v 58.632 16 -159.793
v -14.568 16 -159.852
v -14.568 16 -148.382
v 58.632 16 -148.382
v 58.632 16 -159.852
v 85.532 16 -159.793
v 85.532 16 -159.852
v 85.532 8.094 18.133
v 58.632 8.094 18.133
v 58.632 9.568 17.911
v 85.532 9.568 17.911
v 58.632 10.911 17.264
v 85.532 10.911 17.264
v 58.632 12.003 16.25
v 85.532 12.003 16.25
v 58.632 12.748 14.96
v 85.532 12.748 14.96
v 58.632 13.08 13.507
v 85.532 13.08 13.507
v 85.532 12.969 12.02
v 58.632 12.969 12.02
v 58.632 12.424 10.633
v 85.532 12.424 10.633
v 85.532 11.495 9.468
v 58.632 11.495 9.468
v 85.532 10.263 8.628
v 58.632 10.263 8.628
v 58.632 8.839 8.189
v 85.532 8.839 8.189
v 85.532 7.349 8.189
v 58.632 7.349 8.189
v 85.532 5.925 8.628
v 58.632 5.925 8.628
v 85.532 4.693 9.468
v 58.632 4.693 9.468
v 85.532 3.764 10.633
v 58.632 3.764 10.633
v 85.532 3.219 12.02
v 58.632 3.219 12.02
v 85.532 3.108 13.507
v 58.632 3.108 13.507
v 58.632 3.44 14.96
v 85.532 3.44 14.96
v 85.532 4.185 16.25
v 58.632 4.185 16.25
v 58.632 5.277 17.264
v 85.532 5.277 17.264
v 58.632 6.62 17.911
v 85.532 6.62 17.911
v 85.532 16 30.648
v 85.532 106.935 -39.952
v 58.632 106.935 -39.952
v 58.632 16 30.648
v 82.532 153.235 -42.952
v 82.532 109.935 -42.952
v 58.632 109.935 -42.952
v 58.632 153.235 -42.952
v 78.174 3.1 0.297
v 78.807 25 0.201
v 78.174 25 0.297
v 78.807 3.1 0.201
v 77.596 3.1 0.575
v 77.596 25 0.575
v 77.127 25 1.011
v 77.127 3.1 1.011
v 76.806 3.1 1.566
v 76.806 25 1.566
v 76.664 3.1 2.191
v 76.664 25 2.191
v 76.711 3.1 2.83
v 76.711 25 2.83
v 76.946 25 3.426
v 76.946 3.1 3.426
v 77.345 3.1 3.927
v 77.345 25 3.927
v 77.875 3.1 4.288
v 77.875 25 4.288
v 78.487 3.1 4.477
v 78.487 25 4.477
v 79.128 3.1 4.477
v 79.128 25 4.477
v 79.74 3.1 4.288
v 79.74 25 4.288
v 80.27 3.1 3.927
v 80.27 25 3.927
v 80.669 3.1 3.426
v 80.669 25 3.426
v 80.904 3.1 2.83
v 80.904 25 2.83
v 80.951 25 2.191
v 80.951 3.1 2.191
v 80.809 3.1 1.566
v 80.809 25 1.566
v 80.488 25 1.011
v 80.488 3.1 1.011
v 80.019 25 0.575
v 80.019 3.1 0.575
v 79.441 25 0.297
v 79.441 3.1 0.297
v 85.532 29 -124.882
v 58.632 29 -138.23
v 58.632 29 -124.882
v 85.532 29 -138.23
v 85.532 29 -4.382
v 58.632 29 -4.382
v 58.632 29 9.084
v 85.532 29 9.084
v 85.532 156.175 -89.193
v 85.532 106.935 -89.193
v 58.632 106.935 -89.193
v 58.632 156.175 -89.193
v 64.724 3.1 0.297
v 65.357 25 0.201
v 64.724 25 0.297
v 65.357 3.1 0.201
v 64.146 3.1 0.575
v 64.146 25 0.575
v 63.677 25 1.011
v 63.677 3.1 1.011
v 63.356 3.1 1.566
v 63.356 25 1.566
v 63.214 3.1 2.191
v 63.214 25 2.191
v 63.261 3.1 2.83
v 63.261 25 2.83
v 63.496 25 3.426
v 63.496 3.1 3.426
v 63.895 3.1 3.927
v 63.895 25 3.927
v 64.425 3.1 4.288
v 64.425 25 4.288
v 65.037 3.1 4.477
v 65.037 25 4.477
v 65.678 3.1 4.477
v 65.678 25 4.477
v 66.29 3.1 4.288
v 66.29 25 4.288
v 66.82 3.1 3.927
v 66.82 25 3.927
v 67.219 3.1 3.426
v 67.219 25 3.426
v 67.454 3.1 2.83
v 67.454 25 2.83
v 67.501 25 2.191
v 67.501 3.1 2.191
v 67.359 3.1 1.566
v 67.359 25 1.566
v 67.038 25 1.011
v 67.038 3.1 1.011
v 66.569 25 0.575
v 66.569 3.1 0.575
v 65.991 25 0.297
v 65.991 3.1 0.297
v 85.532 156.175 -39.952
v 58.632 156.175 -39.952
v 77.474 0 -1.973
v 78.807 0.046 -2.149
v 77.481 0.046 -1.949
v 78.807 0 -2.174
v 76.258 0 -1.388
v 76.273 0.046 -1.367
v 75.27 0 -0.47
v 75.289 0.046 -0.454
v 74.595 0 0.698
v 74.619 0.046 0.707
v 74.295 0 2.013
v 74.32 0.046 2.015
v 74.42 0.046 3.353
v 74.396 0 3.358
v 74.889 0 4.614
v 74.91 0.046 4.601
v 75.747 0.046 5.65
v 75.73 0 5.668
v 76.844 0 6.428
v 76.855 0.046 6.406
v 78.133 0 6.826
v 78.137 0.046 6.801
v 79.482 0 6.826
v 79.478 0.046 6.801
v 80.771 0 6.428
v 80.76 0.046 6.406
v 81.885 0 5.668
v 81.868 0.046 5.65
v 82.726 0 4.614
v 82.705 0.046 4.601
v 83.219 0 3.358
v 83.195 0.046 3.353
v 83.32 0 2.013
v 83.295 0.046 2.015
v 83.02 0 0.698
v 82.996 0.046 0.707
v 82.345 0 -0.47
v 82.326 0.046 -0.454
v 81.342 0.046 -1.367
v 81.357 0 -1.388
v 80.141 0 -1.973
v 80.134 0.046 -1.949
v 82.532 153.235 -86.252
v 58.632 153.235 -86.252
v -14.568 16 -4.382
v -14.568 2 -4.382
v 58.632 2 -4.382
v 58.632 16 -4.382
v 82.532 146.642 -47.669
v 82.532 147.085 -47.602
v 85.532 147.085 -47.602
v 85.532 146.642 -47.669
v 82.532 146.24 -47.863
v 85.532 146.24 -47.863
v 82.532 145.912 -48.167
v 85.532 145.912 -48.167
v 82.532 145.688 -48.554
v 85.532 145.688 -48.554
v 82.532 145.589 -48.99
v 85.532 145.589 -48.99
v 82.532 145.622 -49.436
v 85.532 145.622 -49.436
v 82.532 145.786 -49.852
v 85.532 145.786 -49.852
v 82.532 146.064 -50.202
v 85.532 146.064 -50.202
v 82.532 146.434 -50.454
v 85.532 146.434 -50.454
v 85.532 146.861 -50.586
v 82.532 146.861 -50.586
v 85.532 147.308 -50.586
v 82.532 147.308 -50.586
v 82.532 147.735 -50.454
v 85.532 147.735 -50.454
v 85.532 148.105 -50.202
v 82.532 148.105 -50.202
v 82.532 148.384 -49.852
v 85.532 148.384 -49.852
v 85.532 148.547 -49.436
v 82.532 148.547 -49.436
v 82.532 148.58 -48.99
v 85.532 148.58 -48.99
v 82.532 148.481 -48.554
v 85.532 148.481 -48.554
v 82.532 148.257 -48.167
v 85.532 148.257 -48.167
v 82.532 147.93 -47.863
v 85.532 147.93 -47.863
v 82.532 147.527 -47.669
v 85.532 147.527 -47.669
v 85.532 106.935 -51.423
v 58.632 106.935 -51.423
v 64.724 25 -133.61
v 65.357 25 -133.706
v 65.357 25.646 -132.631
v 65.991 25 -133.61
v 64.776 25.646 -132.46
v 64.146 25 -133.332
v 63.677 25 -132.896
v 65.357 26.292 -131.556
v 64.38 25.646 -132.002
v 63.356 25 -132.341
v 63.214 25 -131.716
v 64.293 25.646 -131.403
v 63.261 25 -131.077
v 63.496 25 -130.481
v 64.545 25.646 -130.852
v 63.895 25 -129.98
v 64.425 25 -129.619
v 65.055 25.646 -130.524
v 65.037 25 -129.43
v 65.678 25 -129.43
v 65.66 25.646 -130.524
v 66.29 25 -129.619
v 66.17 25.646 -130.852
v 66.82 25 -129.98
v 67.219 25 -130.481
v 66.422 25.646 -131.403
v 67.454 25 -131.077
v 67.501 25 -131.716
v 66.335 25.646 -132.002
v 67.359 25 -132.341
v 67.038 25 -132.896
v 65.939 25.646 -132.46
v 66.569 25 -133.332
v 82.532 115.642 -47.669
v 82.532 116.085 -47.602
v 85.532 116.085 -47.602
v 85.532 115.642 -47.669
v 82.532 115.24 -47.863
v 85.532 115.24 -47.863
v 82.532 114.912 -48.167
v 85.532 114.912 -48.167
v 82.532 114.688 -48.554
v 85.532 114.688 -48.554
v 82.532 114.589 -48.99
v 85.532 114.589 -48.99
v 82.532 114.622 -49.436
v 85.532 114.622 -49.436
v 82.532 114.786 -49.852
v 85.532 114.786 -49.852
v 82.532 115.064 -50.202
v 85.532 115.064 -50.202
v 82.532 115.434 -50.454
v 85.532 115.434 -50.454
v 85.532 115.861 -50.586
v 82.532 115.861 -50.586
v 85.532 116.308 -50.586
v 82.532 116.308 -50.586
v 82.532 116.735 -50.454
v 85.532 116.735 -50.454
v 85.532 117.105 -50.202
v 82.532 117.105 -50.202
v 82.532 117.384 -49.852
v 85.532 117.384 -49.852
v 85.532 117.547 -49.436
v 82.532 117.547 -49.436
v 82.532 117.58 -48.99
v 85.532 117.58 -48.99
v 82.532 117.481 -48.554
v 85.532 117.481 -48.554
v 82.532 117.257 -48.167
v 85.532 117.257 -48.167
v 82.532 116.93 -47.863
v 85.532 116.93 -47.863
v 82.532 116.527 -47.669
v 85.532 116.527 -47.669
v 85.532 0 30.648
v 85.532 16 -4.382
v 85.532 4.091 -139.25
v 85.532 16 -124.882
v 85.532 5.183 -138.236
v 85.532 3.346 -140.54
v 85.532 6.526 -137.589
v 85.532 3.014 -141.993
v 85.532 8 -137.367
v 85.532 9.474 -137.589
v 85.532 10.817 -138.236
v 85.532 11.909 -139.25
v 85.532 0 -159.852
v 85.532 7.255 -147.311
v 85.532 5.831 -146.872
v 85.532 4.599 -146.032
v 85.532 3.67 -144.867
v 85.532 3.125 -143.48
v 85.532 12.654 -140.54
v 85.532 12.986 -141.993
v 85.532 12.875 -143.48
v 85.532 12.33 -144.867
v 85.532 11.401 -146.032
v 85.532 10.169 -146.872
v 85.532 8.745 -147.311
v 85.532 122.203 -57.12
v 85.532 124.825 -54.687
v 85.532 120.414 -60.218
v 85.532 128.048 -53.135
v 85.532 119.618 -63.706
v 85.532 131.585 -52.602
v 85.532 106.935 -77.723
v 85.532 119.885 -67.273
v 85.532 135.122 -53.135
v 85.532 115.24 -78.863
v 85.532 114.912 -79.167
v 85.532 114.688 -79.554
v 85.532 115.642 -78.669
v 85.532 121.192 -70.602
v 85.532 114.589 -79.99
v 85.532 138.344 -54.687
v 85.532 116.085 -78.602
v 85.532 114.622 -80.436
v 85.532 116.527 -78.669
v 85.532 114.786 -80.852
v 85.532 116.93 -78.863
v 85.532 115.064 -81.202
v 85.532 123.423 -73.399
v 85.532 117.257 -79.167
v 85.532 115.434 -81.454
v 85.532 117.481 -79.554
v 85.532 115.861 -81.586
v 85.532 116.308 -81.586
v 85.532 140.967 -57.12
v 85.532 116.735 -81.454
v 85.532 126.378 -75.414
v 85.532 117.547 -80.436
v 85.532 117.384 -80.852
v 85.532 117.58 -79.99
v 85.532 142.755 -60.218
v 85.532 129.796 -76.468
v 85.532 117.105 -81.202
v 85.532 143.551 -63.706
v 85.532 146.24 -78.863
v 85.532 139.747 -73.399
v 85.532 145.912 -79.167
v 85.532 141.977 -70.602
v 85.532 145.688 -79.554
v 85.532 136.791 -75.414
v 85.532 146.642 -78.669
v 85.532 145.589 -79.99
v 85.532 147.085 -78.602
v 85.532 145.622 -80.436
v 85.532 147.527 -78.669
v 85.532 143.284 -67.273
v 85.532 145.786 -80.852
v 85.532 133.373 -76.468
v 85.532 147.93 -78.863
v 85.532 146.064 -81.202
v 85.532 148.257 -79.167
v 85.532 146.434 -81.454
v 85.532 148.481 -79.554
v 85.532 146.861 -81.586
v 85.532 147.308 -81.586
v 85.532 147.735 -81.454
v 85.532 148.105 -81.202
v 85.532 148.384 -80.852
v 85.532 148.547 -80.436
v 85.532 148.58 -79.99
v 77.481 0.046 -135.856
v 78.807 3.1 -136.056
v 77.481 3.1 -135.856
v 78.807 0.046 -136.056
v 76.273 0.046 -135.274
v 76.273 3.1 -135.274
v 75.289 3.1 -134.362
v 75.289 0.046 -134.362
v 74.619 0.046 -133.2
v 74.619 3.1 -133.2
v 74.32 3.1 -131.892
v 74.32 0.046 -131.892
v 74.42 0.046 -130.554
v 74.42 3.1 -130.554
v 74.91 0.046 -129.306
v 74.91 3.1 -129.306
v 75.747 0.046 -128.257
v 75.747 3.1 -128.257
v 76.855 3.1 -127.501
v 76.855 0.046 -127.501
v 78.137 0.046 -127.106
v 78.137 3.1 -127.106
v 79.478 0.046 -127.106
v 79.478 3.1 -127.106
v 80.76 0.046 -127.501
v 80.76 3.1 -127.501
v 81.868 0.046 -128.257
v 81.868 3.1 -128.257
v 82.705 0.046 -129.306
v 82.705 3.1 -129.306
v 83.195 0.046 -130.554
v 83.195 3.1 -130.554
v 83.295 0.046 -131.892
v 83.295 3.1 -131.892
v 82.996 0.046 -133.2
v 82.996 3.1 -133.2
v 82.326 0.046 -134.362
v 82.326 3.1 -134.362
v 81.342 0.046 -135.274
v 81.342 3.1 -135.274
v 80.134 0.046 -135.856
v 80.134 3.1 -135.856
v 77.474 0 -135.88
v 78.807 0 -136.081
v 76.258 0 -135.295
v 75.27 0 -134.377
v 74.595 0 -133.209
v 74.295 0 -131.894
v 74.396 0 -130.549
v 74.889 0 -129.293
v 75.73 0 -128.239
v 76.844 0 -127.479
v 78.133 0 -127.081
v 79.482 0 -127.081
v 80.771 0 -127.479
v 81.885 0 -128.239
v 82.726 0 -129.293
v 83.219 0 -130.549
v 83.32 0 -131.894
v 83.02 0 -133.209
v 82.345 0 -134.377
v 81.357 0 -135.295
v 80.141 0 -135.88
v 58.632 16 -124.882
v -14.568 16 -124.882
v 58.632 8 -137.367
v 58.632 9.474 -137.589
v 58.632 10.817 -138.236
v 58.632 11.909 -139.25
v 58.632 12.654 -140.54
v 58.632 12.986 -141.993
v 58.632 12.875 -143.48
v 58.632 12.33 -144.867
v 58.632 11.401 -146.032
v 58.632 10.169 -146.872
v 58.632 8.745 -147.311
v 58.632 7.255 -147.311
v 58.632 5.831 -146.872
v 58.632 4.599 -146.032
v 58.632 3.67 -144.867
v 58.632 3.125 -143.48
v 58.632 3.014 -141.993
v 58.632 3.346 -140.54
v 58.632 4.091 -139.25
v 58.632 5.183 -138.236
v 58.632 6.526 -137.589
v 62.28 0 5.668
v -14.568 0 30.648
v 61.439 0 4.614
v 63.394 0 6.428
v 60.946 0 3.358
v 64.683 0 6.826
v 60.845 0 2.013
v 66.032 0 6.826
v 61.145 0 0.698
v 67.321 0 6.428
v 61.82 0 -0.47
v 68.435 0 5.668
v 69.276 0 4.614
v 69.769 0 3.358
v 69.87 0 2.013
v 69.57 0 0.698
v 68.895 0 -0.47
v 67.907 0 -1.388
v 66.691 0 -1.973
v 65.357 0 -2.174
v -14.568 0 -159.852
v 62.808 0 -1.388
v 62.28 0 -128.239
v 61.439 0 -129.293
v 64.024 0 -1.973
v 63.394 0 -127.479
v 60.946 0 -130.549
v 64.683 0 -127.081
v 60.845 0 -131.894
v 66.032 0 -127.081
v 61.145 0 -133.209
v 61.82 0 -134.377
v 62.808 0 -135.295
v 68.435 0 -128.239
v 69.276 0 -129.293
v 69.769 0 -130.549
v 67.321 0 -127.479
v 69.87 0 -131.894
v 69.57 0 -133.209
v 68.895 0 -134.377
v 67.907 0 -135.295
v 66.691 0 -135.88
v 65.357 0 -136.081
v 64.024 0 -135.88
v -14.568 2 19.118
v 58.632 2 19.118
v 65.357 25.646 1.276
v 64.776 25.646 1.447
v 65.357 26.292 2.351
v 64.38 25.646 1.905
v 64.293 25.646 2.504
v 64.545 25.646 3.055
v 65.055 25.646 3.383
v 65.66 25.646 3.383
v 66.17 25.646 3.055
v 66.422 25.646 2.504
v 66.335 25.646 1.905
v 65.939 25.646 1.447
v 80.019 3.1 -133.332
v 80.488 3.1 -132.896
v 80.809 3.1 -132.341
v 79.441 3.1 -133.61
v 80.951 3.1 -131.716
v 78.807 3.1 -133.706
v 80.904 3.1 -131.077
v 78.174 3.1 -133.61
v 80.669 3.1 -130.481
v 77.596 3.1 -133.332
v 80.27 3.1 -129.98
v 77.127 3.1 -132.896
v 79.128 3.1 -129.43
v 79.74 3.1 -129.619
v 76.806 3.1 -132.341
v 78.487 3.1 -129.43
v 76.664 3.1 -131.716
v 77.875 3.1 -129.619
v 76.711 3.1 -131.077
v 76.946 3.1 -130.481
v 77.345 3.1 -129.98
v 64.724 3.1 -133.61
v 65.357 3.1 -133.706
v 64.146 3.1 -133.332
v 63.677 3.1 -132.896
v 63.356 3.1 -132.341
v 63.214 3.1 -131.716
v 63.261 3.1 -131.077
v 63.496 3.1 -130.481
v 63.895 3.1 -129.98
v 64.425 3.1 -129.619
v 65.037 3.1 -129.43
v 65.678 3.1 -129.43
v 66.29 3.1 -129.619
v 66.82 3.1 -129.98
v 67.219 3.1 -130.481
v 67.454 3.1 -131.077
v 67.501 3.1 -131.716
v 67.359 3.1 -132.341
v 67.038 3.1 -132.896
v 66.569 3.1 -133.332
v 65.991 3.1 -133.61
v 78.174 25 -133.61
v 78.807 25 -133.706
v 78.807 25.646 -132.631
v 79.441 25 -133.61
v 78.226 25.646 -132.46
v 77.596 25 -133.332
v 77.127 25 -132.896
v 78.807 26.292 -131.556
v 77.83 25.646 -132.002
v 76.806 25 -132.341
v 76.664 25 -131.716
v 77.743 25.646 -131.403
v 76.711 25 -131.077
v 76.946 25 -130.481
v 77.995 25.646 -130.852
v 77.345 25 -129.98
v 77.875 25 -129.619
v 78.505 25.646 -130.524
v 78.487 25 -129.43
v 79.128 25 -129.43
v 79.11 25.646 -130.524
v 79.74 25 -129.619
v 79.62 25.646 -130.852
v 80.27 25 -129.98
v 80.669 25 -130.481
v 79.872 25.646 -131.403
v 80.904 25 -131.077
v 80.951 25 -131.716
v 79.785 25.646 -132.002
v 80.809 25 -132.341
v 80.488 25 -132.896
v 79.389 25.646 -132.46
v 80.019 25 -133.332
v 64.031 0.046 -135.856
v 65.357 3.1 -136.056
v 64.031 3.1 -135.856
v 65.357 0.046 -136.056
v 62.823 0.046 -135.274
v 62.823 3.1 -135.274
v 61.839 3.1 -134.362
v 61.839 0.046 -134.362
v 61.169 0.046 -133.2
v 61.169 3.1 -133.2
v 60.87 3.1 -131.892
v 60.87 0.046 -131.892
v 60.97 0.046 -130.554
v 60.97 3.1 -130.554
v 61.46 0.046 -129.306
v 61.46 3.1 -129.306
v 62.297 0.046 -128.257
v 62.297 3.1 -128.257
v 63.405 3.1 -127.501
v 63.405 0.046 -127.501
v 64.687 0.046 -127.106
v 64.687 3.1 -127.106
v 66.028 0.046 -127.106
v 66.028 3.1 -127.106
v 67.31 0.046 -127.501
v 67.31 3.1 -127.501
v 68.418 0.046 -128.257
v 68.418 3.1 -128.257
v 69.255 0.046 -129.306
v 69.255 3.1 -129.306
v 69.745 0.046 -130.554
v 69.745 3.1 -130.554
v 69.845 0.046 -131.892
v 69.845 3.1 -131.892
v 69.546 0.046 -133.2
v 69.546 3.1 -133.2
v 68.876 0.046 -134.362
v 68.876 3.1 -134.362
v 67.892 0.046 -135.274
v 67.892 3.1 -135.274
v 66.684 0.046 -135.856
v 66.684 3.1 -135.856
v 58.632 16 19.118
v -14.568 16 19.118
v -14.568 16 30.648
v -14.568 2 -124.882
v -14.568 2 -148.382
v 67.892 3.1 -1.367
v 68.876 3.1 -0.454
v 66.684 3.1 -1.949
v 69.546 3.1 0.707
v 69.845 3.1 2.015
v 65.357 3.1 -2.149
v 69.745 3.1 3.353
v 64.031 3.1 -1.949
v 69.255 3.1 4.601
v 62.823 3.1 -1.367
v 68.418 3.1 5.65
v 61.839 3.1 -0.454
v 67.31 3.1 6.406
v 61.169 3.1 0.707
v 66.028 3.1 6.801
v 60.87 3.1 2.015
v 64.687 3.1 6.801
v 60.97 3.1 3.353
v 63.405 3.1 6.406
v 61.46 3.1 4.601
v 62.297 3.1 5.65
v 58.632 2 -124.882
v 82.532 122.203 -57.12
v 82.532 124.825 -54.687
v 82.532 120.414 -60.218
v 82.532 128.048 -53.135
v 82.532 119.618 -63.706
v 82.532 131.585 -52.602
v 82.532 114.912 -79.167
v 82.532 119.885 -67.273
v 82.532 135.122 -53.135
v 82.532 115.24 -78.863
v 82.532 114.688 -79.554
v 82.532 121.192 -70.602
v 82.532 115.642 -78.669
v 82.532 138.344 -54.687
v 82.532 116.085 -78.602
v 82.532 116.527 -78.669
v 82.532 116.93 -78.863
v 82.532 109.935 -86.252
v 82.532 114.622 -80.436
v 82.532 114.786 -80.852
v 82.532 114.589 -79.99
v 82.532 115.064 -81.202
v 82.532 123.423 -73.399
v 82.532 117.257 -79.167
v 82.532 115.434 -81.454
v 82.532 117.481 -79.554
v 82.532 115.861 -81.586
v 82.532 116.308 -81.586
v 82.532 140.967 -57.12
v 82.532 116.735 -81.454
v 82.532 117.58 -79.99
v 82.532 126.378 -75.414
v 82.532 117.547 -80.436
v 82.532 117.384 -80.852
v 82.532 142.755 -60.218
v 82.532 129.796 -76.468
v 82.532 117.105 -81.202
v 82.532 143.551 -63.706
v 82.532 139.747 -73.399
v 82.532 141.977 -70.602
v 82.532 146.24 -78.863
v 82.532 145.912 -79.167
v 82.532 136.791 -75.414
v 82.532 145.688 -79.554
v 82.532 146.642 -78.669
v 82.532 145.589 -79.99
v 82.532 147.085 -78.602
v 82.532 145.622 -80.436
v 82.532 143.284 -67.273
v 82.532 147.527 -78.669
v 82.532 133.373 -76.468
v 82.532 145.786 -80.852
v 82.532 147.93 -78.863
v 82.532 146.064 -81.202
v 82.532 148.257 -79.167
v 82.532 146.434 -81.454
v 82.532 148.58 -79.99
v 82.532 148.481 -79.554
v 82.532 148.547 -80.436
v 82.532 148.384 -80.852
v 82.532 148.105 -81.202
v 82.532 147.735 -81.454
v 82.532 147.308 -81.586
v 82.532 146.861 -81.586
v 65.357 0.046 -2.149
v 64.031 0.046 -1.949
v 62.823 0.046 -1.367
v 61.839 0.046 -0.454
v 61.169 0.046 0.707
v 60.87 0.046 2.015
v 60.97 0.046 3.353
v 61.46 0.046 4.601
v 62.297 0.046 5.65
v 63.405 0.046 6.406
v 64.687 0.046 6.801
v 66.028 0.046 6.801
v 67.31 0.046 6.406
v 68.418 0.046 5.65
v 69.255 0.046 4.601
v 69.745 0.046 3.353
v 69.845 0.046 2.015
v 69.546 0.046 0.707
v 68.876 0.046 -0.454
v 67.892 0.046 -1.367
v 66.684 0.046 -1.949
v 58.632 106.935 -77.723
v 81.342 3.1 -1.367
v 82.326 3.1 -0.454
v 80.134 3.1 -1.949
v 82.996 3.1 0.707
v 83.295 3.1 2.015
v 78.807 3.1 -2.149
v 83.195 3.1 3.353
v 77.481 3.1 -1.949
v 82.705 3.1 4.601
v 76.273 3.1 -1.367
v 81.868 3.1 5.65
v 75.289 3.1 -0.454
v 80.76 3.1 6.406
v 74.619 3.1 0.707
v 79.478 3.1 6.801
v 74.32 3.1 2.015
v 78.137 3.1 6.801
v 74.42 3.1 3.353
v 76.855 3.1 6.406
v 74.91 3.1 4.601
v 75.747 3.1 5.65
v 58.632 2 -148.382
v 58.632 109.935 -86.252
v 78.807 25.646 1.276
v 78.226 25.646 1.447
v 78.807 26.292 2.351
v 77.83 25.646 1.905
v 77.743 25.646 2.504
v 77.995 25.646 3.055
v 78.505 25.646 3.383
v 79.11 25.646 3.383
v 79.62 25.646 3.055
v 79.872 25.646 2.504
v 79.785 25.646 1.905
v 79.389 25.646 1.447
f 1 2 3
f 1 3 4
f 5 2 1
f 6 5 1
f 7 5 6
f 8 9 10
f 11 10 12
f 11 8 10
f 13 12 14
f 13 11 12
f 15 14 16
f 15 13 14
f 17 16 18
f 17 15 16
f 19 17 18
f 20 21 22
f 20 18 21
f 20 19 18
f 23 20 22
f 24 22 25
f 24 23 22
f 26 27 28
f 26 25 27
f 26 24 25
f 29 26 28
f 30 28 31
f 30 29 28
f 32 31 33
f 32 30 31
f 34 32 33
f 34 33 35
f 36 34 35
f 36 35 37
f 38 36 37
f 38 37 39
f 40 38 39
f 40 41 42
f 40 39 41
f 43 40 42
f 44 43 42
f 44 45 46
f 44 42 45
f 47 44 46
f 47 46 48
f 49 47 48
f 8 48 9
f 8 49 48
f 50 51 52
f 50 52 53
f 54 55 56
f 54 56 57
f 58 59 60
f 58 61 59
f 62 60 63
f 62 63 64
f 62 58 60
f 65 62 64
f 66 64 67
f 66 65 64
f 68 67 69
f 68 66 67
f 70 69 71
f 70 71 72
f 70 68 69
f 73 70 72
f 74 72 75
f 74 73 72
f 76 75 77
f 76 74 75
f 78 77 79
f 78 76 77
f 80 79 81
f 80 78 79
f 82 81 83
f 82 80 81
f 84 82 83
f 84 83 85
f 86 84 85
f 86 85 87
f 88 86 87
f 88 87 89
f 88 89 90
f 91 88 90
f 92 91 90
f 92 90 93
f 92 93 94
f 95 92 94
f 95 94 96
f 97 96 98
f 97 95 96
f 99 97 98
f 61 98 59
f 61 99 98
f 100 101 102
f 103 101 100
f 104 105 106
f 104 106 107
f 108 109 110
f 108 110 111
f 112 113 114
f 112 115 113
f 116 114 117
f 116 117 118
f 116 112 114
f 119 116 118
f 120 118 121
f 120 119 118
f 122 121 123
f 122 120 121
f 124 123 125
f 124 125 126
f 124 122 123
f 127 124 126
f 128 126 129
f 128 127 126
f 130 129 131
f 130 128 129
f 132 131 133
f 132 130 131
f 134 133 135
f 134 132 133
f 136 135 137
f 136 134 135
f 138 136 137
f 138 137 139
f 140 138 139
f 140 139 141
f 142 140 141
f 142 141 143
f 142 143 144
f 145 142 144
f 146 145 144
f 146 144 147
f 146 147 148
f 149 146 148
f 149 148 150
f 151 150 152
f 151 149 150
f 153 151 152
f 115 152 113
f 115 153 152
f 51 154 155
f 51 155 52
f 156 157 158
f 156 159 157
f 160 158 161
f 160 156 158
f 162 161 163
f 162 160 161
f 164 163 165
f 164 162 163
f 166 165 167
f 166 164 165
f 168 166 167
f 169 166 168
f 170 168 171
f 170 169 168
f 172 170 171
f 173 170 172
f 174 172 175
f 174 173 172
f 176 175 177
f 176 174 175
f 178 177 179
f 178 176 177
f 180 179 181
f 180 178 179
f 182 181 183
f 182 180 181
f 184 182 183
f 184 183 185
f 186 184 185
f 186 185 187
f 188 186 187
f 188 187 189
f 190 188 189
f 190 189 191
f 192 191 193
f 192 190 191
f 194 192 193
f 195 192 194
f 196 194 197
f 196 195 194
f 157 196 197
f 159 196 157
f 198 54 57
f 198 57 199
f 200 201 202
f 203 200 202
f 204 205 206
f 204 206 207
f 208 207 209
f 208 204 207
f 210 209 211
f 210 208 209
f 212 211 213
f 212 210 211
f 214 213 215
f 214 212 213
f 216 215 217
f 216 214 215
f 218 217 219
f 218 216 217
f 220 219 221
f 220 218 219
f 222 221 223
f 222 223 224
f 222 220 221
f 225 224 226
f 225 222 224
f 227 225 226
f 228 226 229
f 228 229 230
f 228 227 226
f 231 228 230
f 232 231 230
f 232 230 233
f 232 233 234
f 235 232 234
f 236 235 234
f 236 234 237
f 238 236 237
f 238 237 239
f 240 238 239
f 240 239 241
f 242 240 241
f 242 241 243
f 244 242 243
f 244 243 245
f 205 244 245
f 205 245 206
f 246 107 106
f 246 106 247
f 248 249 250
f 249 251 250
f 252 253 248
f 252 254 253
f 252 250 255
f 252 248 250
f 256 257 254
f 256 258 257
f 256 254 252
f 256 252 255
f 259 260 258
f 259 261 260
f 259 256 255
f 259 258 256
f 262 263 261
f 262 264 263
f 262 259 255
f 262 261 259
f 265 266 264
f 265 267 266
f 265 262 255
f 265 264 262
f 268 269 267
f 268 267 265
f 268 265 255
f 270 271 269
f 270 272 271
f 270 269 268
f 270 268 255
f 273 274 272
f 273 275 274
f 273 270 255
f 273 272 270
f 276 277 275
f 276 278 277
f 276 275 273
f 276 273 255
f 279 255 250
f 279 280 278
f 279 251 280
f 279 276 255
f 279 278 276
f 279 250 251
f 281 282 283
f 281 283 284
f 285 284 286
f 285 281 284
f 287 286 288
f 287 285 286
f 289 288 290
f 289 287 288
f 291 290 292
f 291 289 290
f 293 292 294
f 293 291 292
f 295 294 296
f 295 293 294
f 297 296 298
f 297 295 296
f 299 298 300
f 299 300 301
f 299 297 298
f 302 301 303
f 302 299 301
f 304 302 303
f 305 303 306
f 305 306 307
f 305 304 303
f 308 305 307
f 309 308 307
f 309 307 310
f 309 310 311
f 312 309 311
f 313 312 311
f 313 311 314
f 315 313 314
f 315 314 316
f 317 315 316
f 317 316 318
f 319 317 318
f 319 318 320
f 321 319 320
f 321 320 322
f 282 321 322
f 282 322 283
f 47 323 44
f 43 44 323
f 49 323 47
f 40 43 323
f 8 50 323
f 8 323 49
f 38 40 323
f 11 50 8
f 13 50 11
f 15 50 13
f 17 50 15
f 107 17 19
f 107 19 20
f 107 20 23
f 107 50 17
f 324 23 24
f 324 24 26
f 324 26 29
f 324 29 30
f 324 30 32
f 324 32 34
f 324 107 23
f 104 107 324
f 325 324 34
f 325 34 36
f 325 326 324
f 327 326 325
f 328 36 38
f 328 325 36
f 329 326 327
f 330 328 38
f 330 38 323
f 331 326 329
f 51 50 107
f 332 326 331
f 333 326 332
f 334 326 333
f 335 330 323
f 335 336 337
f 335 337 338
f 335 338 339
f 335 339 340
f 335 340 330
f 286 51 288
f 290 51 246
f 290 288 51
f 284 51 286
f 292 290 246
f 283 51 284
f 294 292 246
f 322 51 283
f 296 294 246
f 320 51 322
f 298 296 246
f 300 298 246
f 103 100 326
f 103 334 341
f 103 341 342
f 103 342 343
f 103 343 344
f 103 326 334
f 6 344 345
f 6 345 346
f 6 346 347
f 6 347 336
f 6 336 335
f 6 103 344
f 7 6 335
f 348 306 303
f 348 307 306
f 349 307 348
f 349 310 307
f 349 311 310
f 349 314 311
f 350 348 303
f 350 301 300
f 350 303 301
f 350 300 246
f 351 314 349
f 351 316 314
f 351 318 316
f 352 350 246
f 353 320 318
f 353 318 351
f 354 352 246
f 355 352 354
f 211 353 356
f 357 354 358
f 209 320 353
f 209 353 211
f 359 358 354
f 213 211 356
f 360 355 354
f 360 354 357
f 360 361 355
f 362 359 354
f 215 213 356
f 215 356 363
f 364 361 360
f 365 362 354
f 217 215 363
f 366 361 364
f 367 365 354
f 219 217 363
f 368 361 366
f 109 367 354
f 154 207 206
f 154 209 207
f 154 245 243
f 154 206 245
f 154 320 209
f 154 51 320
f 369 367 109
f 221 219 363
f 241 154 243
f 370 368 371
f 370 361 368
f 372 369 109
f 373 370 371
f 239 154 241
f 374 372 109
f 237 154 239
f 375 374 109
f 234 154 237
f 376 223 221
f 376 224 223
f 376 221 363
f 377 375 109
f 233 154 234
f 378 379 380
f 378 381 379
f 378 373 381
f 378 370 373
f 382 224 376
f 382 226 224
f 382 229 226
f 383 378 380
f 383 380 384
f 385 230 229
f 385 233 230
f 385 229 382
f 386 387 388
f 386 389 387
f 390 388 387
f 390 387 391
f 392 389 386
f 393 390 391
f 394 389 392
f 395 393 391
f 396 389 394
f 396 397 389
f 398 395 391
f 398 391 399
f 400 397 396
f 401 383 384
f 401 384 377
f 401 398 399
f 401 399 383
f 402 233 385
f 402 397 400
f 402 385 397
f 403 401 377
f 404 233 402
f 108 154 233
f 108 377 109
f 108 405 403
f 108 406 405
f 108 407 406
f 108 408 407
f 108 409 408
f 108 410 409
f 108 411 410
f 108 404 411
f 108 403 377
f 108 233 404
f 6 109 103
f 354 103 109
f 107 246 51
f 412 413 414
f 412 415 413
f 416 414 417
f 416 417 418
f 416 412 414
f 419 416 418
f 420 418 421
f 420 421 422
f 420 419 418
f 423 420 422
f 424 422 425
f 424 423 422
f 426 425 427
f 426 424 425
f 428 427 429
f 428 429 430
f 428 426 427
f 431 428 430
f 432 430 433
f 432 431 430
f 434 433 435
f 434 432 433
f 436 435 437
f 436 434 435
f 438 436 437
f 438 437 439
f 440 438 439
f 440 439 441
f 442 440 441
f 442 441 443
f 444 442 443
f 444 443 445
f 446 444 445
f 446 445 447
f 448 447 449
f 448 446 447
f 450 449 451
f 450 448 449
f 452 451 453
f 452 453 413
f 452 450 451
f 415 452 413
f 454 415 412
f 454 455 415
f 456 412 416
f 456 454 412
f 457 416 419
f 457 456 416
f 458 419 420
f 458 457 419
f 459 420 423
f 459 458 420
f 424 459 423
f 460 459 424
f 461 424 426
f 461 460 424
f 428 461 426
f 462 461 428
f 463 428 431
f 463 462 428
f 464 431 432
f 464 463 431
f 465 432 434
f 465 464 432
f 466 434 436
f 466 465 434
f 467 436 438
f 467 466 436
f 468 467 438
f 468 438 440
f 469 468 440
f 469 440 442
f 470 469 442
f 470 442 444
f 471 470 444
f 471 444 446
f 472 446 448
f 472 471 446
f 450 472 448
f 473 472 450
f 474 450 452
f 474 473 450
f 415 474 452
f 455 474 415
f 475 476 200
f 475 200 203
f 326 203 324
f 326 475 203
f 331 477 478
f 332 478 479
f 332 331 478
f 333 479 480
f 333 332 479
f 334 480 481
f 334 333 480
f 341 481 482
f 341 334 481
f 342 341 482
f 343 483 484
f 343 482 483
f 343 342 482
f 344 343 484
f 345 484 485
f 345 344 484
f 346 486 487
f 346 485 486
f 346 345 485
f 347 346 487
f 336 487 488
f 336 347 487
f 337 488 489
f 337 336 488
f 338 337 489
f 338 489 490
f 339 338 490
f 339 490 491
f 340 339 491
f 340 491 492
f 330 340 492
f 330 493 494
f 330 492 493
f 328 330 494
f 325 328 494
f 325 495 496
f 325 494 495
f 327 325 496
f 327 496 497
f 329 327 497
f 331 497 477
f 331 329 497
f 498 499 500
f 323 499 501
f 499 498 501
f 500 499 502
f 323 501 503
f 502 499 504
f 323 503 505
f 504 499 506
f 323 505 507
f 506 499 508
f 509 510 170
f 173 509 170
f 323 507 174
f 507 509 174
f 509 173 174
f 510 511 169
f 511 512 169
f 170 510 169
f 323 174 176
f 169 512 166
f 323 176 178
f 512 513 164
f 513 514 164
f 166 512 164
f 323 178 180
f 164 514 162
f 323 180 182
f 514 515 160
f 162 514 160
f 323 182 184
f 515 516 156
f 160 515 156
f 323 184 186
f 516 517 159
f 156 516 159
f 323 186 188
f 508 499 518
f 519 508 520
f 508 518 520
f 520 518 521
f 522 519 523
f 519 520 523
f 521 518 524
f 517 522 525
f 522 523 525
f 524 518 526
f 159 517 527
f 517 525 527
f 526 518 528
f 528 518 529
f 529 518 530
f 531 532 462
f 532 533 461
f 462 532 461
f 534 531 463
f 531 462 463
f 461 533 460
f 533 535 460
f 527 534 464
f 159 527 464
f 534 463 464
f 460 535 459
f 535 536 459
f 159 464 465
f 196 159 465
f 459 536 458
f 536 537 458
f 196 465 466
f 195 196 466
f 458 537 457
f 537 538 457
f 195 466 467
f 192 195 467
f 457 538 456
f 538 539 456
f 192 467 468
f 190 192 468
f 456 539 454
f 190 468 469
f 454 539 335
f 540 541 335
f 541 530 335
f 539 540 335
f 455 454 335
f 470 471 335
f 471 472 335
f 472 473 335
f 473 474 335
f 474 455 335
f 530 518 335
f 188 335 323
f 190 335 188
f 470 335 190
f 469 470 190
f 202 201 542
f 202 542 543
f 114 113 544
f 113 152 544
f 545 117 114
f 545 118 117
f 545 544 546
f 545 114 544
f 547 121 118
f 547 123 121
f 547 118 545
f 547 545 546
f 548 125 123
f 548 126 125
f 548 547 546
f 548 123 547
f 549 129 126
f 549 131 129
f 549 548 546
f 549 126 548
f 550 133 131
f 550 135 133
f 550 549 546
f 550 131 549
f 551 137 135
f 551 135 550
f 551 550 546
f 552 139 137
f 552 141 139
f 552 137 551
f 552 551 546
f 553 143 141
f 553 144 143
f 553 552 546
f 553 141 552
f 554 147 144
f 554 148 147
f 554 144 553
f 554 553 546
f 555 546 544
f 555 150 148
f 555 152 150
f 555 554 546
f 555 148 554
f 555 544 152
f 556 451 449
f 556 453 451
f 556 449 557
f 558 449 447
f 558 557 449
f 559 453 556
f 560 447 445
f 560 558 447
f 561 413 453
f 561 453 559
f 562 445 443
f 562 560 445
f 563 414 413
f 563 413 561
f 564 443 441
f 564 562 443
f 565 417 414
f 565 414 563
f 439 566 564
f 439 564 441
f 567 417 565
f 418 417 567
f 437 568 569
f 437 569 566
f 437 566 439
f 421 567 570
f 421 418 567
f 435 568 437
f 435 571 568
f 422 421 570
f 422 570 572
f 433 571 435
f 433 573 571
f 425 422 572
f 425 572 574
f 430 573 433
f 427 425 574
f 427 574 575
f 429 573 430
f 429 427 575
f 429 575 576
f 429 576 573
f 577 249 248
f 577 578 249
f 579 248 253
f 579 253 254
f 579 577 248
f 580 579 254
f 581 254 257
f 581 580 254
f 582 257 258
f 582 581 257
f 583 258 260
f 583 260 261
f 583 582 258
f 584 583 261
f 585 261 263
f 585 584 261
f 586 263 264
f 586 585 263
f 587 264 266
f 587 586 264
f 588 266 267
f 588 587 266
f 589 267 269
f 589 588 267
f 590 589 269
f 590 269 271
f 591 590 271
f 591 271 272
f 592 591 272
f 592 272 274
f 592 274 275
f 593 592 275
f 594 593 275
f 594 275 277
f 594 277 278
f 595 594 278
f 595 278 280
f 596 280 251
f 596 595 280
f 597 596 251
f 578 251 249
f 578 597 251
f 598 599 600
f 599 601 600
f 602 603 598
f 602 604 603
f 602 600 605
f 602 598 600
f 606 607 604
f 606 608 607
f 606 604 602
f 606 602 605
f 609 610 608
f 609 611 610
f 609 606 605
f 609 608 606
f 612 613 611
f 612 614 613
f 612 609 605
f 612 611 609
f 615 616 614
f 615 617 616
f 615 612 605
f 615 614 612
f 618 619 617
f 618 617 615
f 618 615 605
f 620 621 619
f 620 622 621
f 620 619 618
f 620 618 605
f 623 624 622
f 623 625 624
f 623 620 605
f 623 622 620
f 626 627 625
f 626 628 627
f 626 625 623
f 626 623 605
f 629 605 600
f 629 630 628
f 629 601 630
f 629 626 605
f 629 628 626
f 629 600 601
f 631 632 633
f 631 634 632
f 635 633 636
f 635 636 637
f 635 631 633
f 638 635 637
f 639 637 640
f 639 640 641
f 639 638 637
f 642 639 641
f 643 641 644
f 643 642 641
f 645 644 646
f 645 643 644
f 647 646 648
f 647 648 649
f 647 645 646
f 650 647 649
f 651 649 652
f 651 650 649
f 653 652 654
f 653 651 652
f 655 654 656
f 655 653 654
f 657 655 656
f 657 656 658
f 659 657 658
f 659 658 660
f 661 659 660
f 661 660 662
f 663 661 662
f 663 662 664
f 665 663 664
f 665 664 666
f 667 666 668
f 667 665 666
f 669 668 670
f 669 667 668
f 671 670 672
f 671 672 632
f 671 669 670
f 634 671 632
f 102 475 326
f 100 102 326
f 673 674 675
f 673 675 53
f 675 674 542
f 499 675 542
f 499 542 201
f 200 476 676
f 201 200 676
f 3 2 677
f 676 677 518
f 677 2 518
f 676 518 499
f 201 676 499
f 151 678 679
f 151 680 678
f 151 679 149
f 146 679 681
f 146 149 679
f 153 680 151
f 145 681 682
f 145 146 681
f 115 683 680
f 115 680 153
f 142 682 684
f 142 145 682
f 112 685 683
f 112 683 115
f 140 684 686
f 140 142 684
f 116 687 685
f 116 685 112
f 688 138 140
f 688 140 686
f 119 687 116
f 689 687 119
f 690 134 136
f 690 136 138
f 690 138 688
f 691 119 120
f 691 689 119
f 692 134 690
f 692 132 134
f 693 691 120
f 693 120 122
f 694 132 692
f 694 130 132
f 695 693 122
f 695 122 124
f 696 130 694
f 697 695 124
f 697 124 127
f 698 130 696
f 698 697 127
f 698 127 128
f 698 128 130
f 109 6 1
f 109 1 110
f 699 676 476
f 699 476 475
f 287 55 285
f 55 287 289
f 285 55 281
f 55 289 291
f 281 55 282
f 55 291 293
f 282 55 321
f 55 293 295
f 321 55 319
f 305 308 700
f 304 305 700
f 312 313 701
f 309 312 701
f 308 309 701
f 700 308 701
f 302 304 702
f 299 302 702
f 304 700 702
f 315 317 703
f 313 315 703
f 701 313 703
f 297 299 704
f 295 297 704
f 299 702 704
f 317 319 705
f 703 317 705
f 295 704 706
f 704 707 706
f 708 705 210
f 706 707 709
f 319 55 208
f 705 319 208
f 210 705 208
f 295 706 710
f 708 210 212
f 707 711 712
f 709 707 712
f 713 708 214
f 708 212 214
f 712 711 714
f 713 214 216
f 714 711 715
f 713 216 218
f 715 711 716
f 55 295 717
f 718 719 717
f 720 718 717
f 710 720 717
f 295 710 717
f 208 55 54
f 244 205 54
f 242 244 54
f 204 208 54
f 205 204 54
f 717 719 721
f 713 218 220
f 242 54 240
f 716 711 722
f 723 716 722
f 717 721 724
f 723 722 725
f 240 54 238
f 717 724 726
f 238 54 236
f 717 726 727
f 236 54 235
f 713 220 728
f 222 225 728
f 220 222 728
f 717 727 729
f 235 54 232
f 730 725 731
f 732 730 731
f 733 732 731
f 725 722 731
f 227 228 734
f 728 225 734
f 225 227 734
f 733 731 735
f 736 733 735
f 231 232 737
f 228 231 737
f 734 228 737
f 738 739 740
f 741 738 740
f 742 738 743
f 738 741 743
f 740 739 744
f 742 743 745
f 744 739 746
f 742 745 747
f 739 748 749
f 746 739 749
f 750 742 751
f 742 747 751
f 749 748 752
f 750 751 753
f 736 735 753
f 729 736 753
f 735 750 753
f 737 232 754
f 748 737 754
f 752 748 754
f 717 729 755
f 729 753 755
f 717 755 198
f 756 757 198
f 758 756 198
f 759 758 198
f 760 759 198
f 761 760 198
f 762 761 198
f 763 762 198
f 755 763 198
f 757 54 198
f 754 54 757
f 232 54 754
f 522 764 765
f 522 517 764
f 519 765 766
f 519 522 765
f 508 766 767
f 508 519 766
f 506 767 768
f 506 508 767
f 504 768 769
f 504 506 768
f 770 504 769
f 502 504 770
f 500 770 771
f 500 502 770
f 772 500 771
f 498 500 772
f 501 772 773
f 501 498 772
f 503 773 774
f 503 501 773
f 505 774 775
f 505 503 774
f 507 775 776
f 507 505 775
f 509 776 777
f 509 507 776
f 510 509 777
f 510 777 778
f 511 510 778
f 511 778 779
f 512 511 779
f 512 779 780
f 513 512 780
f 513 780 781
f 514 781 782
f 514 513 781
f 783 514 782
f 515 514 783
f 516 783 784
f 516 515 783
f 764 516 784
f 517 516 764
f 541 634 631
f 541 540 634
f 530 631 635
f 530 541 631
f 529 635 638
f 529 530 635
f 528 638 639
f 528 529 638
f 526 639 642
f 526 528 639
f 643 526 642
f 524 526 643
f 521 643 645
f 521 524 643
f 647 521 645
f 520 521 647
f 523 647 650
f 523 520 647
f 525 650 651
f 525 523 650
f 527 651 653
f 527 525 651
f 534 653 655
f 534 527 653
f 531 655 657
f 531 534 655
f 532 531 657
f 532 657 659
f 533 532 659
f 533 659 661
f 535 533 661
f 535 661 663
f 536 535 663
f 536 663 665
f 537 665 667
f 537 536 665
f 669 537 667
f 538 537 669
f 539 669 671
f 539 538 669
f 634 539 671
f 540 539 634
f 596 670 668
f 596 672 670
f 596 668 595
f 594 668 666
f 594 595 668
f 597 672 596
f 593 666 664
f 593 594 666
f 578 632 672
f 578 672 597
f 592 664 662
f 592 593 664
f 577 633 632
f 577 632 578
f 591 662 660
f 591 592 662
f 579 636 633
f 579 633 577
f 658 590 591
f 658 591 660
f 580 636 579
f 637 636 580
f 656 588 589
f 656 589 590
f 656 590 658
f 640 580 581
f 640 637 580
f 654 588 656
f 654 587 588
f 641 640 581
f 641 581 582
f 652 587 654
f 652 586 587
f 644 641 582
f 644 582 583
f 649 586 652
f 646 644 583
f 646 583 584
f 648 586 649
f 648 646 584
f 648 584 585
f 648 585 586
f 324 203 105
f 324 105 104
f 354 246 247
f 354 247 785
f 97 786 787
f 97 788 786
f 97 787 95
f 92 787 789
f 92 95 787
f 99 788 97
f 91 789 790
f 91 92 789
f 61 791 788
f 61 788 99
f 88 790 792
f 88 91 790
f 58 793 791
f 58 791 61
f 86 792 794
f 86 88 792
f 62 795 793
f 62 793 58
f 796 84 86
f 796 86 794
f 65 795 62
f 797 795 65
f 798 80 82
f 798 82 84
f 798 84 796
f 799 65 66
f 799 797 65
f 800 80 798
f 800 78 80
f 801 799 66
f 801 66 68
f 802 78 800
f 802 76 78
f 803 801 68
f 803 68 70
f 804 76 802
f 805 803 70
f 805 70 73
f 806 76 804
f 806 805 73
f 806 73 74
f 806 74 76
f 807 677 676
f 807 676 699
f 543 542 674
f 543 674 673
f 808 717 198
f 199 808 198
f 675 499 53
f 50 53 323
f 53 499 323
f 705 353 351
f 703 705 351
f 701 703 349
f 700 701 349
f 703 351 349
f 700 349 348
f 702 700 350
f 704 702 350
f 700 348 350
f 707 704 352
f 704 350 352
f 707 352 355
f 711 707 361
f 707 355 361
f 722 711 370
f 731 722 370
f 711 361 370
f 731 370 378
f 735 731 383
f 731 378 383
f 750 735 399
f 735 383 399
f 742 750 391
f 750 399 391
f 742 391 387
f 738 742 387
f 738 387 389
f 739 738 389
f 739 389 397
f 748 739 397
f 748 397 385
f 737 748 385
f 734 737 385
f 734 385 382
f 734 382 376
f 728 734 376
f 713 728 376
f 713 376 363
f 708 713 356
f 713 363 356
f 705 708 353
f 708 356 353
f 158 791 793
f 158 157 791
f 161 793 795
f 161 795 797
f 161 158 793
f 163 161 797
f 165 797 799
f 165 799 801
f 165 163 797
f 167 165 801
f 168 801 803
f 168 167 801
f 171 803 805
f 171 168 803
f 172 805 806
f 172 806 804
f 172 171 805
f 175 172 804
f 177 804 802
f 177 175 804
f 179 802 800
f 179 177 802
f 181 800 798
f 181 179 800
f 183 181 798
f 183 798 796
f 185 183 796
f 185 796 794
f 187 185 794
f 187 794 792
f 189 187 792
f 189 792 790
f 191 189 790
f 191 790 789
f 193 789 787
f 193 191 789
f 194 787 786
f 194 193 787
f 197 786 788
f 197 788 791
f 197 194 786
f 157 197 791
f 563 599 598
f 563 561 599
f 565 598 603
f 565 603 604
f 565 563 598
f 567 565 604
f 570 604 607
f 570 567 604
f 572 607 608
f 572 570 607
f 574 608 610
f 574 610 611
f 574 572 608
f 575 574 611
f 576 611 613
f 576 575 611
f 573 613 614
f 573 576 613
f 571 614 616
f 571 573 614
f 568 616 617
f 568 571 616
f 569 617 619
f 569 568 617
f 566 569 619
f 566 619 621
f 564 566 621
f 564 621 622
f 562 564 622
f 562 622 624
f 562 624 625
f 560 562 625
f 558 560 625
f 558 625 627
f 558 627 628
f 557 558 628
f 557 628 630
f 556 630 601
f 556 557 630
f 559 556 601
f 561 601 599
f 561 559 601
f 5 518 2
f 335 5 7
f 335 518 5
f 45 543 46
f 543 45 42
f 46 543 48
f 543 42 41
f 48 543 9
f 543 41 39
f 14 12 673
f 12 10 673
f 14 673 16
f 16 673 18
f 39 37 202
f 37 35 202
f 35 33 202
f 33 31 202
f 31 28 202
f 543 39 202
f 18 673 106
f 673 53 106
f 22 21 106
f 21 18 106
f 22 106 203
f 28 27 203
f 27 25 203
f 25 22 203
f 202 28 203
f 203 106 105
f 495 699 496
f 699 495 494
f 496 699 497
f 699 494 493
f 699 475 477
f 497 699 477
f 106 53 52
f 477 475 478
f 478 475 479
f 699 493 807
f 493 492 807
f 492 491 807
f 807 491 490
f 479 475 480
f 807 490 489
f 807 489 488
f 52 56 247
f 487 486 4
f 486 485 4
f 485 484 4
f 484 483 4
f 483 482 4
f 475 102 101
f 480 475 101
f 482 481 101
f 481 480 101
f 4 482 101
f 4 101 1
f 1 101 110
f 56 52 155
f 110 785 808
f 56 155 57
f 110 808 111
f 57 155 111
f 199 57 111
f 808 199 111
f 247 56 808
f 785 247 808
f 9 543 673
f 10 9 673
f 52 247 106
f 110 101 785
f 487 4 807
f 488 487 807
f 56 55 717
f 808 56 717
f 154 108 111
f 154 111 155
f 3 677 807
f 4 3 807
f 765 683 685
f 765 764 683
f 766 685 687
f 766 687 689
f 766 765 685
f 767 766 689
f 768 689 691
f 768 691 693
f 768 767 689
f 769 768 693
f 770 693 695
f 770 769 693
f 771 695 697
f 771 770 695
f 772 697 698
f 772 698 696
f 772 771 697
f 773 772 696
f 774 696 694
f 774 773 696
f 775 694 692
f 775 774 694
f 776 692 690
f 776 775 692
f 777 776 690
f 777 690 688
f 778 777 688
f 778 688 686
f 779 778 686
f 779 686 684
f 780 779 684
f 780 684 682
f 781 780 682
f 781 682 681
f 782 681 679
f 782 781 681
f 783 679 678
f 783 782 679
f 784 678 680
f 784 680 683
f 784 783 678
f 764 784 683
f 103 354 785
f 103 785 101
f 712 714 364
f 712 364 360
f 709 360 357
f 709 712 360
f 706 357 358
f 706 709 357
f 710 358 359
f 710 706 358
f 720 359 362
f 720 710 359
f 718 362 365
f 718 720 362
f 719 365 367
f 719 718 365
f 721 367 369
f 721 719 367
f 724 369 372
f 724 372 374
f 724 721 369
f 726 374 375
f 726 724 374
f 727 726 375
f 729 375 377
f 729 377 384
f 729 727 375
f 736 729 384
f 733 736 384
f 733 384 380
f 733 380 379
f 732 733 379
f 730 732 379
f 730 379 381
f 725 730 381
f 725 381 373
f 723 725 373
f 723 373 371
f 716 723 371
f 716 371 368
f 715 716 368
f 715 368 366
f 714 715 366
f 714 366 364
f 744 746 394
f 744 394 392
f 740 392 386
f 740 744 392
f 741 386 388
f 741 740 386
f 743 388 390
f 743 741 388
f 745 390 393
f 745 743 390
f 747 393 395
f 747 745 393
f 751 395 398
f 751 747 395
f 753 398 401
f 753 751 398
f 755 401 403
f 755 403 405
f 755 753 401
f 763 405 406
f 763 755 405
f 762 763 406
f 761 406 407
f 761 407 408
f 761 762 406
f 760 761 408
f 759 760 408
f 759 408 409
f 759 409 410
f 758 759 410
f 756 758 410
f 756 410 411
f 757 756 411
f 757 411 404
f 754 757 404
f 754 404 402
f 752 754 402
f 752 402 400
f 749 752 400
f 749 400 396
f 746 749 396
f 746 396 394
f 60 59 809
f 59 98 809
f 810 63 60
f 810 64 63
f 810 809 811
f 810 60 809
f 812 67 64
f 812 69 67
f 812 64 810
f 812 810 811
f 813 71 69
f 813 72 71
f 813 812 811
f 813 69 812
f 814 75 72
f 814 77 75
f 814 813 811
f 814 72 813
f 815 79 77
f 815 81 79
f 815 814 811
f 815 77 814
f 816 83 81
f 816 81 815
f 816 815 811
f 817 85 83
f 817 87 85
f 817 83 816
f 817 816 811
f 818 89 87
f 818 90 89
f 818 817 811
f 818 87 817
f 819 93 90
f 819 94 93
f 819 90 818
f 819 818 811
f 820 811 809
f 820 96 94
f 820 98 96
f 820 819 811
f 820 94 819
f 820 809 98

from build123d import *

# Parameters (mm, degrees)
SKETCH1_W                                     = 127
SKETCH1_H                                     = 190.5
BOSS_EXTRUDE1_DEPTH                           = 16
SKETCH3_W                                     = 73.2
SKETCH3_H                                     = 190.5
CUT_EXTRUDE2_DEPTH                            = 14
SKETCH6_W                                     = 73.2
SKETCH6_H                                     = 120.5
SKETCH6_H_2                                   = 11.470358649
SKETCH6_H_3                                   = 11.529641351
BOSS_EXTRUDE5_DEPTH                           = 14
SKETCH9_W                                     = 49.3
SKETCH9_H                                     = 49.3
SKETCH9_W_2                                   = 43.3
SKETCH9_H_2                                   = 43.3
BOSS_EXTRUDE7_DEPTH                           = 26.9
SKETCH9_5_W                                   = 43.3
SKETCH9_5_H                                   = 43.3
SKETCH9_5_W_2                                 = 31.3
SKETCH9_5_H_2                                 = 31.3
SKETCH9_5_R                                   = 12
BOSS_EXTRUDE8_DEPTH                           = 3
SKETCH10_W                                    = 43.3
SKETCH10_H                                    = 43.3
BOSS_EXTRUDE11_DEPTH                          = 26.9
SKETCH10_5_W                                  = 43.3
SKETCH10_5_H                                  = 43.3
SKETCH10_5_W_2                                = 31.3
SKETCH10_5_H_2                                = 31.3
SKETCH10_5_R                                  = 12
BOSS_EXTRUDE12_DEPTH                          = 3
SKETCH12_R                                    = 1.5
CUT_EXTRUDE4_DEPTH                            = 124
SKETCH13_W                                    = 26.9
SKETCH13_H                                    = 23.5
SKETCH13_H_2                                  = 23.559282703
SKETCH13_H_3                                  = 23.440717297
BOSS_EXTRUDE13_DEPTH                          = 13
CBORE_FOR_M4_PAN_HEAD_MACHINE_SCREW1_AT_COUNT = 2
CBORE_FOR_M4_PAN_HEAD_MACHINE_SCREW1_AT_PITCH = 13.45
CBORE_FOR_M4_PAN_HEAD_MACHINE_SCREW1_2_COUNT  = 2
CBORE_FOR_M4_PAN_HEAD_MACHINE_SCREW1_2_PITCH  = 86.65000507
CBORE_FOR_M4_PAN_HEAD_MACHINE_SCREW1_3_COUNT  = 2
CBORE_FOR_M4_PAN_HEAD_MACHINE_SCREW1_3_PITCH  = 100.100004389
CBORE_FOR_M4_PAN_HEAD_MACHINE_SCREW1_4_COUNT  = 2
CBORE_FOR_M4_PAN_HEAD_MACHINE_SCREW1_4_PITCH  = 167.16209619
CBORE_FOR_M4_PAN_HEAD_MACHINE_SCREW1_5_COUNT  = 2
CBORE_FOR_M4_PAN_HEAD_MACHINE_SCREW1_5_PITCH  = 159.472188492
CBORE_FOR_M4_PAN_HEAD_MACHINE_SCREW1_6_COUNT  = 2
CBORE_FOR_M4_PAN_HEAD_MACHINE_SCREW1_6_PITCH  = 133.877393172
CBORE_FOR_M4_PAN_HEAD_MACHINE_SCREW1_7_COUNT  = 2
CBORE_FOR_M4_PAN_HEAD_MACHINE_SCREW1_7_PITCH  = 134.551324417
CUT_EXTRUDE8_START                            = -127
SKETCH27_R                                    = 5
CUT_EXTRUDE8_DEPTH                            = 127
SPLIT1_SURFACE_1_BACK                         = 278.18
SPLIT1_SURFACE_1_DEPTH                        = 556.36


with BuildPart() as part:
    # Sketch1 → Boss-Extrude1 (new body)
    with BuildSketch(Plane(origin=(0, 0, 0), x_dir=(1, 0, 0), z_dir=(0, 1, 0))):
        with Locations((22.032491394, 64.602312685)):
            Rectangle(SKETCH1_W, SKETCH1_H)
    extrude(amount=BOSS_EXTRUDE1_DEPTH)

    # Sketch3 → Cut-Extrude2 (cut)
    with BuildSketch(Plane(origin=(0, 16, 0), x_dir=(1, 0, 0), z_dir=(0, 1, 0))):
        with Locations((22.032491394, 64.602312685)):
            Rectangle(SKETCH3_W, SKETCH3_H)
    extrude(amount=-CUT_EXTRUDE2_DEPTH, mode=Mode.SUBTRACT)

    # Sketch6 → Boss-Extrude5 (add)
    with BuildSketch(Plane(origin=(0, 2, 0), x_dir=(1, 0, 0), z_dir=(0, 1, 0))):
        with Locations((22.032491394, 64.631954036)):
            Rectangle(SKETCH6_W, SKETCH6_H)
        with Locations((22.032491394, 154.117133361)):
            Rectangle(SKETCH6_W, SKETCH6_H_2)
        with Locations((22.032491394, -24.88286664)):
            Rectangle(SKETCH6_W, SKETCH6_H_3)
    extrude(amount=BOSS_EXTRUDE5_DEPTH)

    # Sketch9 → Boss-Extrude7 (add)
    with BuildSketch(Plane.ZY.offset(41.467508606)):
        Polygon((-77.781954036, 106.934621953), (-89.252312685, 106.934621953), (-159.852312685, 16), (-148.381954036, 16), align=None)
        with Locations((-64.602312685, 131.584621953)):
            Rectangle(SKETCH9_W, SKETCH9_H)
        with Locations((-64.602312685, 131.584621953)):
            Rectangle(SKETCH9_W_2, SKETCH9_H_2, mode=Mode.SUBTRACT)
        Polygon((30.647687315, 16), (-39.952312685, 106.934621953), (-51.481954036, 106.934621953), (19.118045964, 16), align=None)
    extrude(amount=-BOSS_EXTRUDE7_DEPTH)

    # Sketch9<5> → Boss-Extrude8 (add)
    with BuildSketch(Plane.ZY.offset(41.467508606)):
        with Locations((-64.602312685, 131.584621953)):
            Rectangle(SKETCH9_5_W, SKETCH9_5_H)
        with Locations((-64.602312685, 131.584621953)):
            Rectangle(SKETCH9_5_W_2, SKETCH9_5_H_2, mode=Mode.SUBTRACT)
        with Locations((-64.602312685, 131.584621953)):
            Rectangle(SKETCH9_5_W_2, SKETCH9_5_H_2)
        with Locations((-64.602312685, 131.584621953)):
            Circle(SKETCH9_5_R, mode=Mode.SUBTRACT)
    extrude(amount=-BOSS_EXTRUDE8_DEPTH)

    # Sketch10 → Boss-Extrude11 (add)
    with BuildSketch(Plane(origin=(85.532491394, 0, 0), x_dir=(0, 0, -1), z_dir=(1, 0, 0))):
        Polygon((89.192671333, 156.174980602), (39.952312685, 156.174980602), (39.952312685, 106.934621953), (-30.647687315, 16), (-19.177328667, 16), (51.422671333, 106.934621953), (77.722671333, 106.934621953), (148.322671333, 16), (159.792671333, 16), (89.192671333, 106.934621953), align=None)
        with Locations((64.602312685, 131.584621953)):
            Rectangle(SKETCH10_W, SKETCH10_H, mode=Mode.SUBTRACT)
    extrude(amount=-BOSS_EXTRUDE11_DEPTH)

    # Sketch10<5> → Boss-Extrude12 (add)
    with BuildSketch(Plane(origin=(85.532491394, 0, 0), x_dir=(0, 0, -1), z_dir=(1, 0, 0))):
        with Locations((64.602312685, 131.584621953)):
            Rectangle(SKETCH10_5_W, SKETCH10_5_H)
        with Locations((64.602312685, 131.584621953)):
            Rectangle(SKETCH10_5_W_2, SKETCH10_5_H_2, mode=Mode.SUBTRACT)
        with Locations((64.602312685, 131.584621953)):
            Rectangle(SKETCH10_5_W_2, SKETCH10_5_H_2)
        with Locations(Location((64.602312685, 131.584621953, 0), (0, 0, 180))):
            Circle(SKETCH10_5_R, mode=Mode.SUBTRACT)
    extrude(amount=-BOSS_EXTRUDE12_DEPTH)

    # Sketch12 → Cut-Extrude4 (cut)
    with BuildSketch(Plane(origin=(-38.467508606, 0, 0), x_dir=(0, 0, -1), z_dir=(1, 0, 0))):
        with Locations(Location((80.102312685, 147.084621953, 0), (0, 0, 180))):
            Circle(SKETCH12_R)
        with Locations(Location((49.102312685, 147.084621953, 0), (0, 0, 180))):
            Circle(SKETCH12_R)
        with Locations(Location((49.102312685, 116.084621953, 0), (0, 0, 180))):
            Circle(SKETCH12_R)
        with Locations(Location((80.102312685, 116.084621953, 0), (0, 0, 180))):
            Circle(SKETCH12_R)
    extrude(amount=CUT_EXTRUDE4_DEPTH, mode=Mode.SUBTRACT)

    # Sketch13 → Boss-Extrude13 (add)
    with BuildSketch(Plane(origin=(0, 16, 0), x_dir=(1, 0, 0), z_dir=(0, 1, 0))):
        with Locations((-28.017508606, 136.631954036)):
            Rectangle(SKETCH13_W, SKETCH13_H)
        with Locations((-28.017508606, -7.368045964)):
            Rectangle(SKETCH13_W, SKETCH13_H)
        with Locations((72.082491394, -7.397687316)):
            Rectangle(SKETCH13_W, SKETCH13_H_2)
        with Locations((72.082491394, 136.602312685)):
            Rectangle(SKETCH13_W, SKETCH13_H_3)
    extrude(amount=BOSS_EXTRUDE13_DEPTH)

    # Sketch24 → CBORE for M4 Pan Head Machine Screw1 (revolve, cut)
    with BuildSketch(Plane(origin=(-21.292508606, 0, 2.321563226), x_dir=(0, 0, -1), z_dir=(1, 0, 0))):
        Polygon((0, 0), (0, 26.291850331), (2.15, 25), (2.15, 3.1), (4.5, 3.1), (4.5, 0.046044272), (4.525, 0), align=None)
    cbore_for_m4_pan_head_machine_screw1 = revolve(axis=Axis((-21.292508606, -6.35, 2.321563226), (0, 1, 0)), mode=Mode.SUBTRACT)

    # CBORE for M4 Pan Head Machine Screw1 at: CBORE for M4 Pan Head Machine Screw1 ×2
    with Locations(*[(-i * CBORE_FOR_M4_PAN_HEAD_MACHINE_SCREW1_AT_PITCH, 0, 0) for i in range(1, CBORE_FOR_M4_PAN_HEAD_MACHINE_SCREW1_AT_COUNT)]):
        add(cbore_for_m4_pan_head_machine_screw1, mode=Mode.SUBTRACT)

    # CBORE for M4 Pan Head Machine Screw1 2: CBORE for M4 Pan Head Machine Screw1 ×2
    with Locations(*[Vector(0.9999999414901701, 0, 0.00034208135925630124) * (i * CBORE_FOR_M4_PAN_HEAD_MACHINE_SCREW1_2_PITCH) for i in range(1, CBORE_FOR_M4_PAN_HEAD_MACHINE_SCREW1_2_COUNT)]):
        add(cbore_for_m4_pan_head_machine_screw1, mode=Mode.SUBTRACT)

    # CBORE for M4 Pan Head Machine Screw1 3: CBORE for M4 Pan Head Machine Screw1 ×2
    with Locations(*[Vector(0.9999999561572464, 0, 0.0002961173847583374) * (i * CBORE_FOR_M4_PAN_HEAD_MACHINE_SCREW1_3_PITCH) for i in range(1, CBORE_FOR_M4_PAN_HEAD_MACHINE_SCREW1_3_COUNT)]):
        add(cbore_for_m4_pan_head_machine_screw1, mode=Mode.SUBTRACT)

    # CBORE for M4 Pan Head Machine Screw1 4: CBORE for M4 Pan Head Machine Screw1 ×2
    with Locations(*[Vector(0.5988199614729853, 0, -0.8008836705424156) * (i * CBORE_FOR_M4_PAN_HEAD_MACHINE_SCREW1_4_PITCH) for i in range(1, CBORE_FOR_M4_PAN_HEAD_MACHINE_SCREW1_4_COUNT)]):
        add(cbore_for_m4_pan_head_machine_screw1, mode=Mode.SUBTRACT)

    # CBORE for M4 Pan Head Machine Screw1 5: CBORE for M4 Pan Head Machine Screw1 ×2
    with Locations(*[Vector(0.5433549311591849, 0, -0.8395030784845268) * (i * CBORE_FOR_M4_PAN_HEAD_MACHINE_SCREW1_5_PITCH) for i in range(1, CBORE_FOR_M4_PAN_HEAD_MACHINE_SCREW1_5_COUNT)]):
        add(cbore_for_m4_pan_head_machine_screw1, mode=Mode.SUBTRACT)

    # CBORE for M4 Pan Head Machine Screw1 6: CBORE for M4 Pan Head Machine Screw1 ×2
    with Locations(*[(0, 0, -i * CBORE_FOR_M4_PAN_HEAD_MACHINE_SCREW1_6_PITCH) for i in range(1, CBORE_FOR_M4_PAN_HEAD_MACHINE_SCREW1_6_COUNT)]):
        add(cbore_for_m4_pan_head_machine_screw1, mode=Mode.SUBTRACT)

    # CBORE for M4 Pan Head Machine Screw1 7: CBORE for M4 Pan Head Machine Screw1 ×2
    with Locations(*[Vector(-0.09996185513764777, 0, -0.9949912700709691) * (i * CBORE_FOR_M4_PAN_HEAD_MACHINE_SCREW1_7_PITCH) for i in range(1, CBORE_FOR_M4_PAN_HEAD_MACHINE_SCREW1_7_COUNT)]):
        add(cbore_for_m4_pan_head_machine_screw1, mode=Mode.SUBTRACT)

    # Sketch27 → Cut-Extrude8 (cut)
    with BuildSketch(Plane.ZY.offset(41.467508606).offset(CUT_EXTRUDE8_START)):
        with Locations((-142.36713336, 8)):
            Circle(SKETCH27_R)
        with Locations((13.13286664, 8.093964388)):
            Circle(SKETCH27_R)
    extrude(amount=CUT_EXTRUDE8_DEPTH, mode=Mode.SUBTRACT)

    # Split1: cut with a surface, the side it looks to stays
    # Split1 surface: a surface, the sketch's curves swept straight by 556.36 mm
    with BuildLine(Plane.XY.offset(30.647687315).offset(-SPLIT1_SURFACE_1_BACK), mode=Mode.PRIVATE) as split1_surface_1_path:
        Line((-14.567508606, 16), (-14.567508606, 0))
    split1_surface_1 = Shell.extrude(split1_surface_1_path.wire(), (0 * SPLIT1_SURFACE_1_DEPTH, 0 * SPLIT1_SURFACE_1_DEPTH, 1 * SPLIT1_SURFACE_1_DEPTH))
    split(bisect_by=split1_surface_1, keep=Keep.TOP)


solid = part.part
